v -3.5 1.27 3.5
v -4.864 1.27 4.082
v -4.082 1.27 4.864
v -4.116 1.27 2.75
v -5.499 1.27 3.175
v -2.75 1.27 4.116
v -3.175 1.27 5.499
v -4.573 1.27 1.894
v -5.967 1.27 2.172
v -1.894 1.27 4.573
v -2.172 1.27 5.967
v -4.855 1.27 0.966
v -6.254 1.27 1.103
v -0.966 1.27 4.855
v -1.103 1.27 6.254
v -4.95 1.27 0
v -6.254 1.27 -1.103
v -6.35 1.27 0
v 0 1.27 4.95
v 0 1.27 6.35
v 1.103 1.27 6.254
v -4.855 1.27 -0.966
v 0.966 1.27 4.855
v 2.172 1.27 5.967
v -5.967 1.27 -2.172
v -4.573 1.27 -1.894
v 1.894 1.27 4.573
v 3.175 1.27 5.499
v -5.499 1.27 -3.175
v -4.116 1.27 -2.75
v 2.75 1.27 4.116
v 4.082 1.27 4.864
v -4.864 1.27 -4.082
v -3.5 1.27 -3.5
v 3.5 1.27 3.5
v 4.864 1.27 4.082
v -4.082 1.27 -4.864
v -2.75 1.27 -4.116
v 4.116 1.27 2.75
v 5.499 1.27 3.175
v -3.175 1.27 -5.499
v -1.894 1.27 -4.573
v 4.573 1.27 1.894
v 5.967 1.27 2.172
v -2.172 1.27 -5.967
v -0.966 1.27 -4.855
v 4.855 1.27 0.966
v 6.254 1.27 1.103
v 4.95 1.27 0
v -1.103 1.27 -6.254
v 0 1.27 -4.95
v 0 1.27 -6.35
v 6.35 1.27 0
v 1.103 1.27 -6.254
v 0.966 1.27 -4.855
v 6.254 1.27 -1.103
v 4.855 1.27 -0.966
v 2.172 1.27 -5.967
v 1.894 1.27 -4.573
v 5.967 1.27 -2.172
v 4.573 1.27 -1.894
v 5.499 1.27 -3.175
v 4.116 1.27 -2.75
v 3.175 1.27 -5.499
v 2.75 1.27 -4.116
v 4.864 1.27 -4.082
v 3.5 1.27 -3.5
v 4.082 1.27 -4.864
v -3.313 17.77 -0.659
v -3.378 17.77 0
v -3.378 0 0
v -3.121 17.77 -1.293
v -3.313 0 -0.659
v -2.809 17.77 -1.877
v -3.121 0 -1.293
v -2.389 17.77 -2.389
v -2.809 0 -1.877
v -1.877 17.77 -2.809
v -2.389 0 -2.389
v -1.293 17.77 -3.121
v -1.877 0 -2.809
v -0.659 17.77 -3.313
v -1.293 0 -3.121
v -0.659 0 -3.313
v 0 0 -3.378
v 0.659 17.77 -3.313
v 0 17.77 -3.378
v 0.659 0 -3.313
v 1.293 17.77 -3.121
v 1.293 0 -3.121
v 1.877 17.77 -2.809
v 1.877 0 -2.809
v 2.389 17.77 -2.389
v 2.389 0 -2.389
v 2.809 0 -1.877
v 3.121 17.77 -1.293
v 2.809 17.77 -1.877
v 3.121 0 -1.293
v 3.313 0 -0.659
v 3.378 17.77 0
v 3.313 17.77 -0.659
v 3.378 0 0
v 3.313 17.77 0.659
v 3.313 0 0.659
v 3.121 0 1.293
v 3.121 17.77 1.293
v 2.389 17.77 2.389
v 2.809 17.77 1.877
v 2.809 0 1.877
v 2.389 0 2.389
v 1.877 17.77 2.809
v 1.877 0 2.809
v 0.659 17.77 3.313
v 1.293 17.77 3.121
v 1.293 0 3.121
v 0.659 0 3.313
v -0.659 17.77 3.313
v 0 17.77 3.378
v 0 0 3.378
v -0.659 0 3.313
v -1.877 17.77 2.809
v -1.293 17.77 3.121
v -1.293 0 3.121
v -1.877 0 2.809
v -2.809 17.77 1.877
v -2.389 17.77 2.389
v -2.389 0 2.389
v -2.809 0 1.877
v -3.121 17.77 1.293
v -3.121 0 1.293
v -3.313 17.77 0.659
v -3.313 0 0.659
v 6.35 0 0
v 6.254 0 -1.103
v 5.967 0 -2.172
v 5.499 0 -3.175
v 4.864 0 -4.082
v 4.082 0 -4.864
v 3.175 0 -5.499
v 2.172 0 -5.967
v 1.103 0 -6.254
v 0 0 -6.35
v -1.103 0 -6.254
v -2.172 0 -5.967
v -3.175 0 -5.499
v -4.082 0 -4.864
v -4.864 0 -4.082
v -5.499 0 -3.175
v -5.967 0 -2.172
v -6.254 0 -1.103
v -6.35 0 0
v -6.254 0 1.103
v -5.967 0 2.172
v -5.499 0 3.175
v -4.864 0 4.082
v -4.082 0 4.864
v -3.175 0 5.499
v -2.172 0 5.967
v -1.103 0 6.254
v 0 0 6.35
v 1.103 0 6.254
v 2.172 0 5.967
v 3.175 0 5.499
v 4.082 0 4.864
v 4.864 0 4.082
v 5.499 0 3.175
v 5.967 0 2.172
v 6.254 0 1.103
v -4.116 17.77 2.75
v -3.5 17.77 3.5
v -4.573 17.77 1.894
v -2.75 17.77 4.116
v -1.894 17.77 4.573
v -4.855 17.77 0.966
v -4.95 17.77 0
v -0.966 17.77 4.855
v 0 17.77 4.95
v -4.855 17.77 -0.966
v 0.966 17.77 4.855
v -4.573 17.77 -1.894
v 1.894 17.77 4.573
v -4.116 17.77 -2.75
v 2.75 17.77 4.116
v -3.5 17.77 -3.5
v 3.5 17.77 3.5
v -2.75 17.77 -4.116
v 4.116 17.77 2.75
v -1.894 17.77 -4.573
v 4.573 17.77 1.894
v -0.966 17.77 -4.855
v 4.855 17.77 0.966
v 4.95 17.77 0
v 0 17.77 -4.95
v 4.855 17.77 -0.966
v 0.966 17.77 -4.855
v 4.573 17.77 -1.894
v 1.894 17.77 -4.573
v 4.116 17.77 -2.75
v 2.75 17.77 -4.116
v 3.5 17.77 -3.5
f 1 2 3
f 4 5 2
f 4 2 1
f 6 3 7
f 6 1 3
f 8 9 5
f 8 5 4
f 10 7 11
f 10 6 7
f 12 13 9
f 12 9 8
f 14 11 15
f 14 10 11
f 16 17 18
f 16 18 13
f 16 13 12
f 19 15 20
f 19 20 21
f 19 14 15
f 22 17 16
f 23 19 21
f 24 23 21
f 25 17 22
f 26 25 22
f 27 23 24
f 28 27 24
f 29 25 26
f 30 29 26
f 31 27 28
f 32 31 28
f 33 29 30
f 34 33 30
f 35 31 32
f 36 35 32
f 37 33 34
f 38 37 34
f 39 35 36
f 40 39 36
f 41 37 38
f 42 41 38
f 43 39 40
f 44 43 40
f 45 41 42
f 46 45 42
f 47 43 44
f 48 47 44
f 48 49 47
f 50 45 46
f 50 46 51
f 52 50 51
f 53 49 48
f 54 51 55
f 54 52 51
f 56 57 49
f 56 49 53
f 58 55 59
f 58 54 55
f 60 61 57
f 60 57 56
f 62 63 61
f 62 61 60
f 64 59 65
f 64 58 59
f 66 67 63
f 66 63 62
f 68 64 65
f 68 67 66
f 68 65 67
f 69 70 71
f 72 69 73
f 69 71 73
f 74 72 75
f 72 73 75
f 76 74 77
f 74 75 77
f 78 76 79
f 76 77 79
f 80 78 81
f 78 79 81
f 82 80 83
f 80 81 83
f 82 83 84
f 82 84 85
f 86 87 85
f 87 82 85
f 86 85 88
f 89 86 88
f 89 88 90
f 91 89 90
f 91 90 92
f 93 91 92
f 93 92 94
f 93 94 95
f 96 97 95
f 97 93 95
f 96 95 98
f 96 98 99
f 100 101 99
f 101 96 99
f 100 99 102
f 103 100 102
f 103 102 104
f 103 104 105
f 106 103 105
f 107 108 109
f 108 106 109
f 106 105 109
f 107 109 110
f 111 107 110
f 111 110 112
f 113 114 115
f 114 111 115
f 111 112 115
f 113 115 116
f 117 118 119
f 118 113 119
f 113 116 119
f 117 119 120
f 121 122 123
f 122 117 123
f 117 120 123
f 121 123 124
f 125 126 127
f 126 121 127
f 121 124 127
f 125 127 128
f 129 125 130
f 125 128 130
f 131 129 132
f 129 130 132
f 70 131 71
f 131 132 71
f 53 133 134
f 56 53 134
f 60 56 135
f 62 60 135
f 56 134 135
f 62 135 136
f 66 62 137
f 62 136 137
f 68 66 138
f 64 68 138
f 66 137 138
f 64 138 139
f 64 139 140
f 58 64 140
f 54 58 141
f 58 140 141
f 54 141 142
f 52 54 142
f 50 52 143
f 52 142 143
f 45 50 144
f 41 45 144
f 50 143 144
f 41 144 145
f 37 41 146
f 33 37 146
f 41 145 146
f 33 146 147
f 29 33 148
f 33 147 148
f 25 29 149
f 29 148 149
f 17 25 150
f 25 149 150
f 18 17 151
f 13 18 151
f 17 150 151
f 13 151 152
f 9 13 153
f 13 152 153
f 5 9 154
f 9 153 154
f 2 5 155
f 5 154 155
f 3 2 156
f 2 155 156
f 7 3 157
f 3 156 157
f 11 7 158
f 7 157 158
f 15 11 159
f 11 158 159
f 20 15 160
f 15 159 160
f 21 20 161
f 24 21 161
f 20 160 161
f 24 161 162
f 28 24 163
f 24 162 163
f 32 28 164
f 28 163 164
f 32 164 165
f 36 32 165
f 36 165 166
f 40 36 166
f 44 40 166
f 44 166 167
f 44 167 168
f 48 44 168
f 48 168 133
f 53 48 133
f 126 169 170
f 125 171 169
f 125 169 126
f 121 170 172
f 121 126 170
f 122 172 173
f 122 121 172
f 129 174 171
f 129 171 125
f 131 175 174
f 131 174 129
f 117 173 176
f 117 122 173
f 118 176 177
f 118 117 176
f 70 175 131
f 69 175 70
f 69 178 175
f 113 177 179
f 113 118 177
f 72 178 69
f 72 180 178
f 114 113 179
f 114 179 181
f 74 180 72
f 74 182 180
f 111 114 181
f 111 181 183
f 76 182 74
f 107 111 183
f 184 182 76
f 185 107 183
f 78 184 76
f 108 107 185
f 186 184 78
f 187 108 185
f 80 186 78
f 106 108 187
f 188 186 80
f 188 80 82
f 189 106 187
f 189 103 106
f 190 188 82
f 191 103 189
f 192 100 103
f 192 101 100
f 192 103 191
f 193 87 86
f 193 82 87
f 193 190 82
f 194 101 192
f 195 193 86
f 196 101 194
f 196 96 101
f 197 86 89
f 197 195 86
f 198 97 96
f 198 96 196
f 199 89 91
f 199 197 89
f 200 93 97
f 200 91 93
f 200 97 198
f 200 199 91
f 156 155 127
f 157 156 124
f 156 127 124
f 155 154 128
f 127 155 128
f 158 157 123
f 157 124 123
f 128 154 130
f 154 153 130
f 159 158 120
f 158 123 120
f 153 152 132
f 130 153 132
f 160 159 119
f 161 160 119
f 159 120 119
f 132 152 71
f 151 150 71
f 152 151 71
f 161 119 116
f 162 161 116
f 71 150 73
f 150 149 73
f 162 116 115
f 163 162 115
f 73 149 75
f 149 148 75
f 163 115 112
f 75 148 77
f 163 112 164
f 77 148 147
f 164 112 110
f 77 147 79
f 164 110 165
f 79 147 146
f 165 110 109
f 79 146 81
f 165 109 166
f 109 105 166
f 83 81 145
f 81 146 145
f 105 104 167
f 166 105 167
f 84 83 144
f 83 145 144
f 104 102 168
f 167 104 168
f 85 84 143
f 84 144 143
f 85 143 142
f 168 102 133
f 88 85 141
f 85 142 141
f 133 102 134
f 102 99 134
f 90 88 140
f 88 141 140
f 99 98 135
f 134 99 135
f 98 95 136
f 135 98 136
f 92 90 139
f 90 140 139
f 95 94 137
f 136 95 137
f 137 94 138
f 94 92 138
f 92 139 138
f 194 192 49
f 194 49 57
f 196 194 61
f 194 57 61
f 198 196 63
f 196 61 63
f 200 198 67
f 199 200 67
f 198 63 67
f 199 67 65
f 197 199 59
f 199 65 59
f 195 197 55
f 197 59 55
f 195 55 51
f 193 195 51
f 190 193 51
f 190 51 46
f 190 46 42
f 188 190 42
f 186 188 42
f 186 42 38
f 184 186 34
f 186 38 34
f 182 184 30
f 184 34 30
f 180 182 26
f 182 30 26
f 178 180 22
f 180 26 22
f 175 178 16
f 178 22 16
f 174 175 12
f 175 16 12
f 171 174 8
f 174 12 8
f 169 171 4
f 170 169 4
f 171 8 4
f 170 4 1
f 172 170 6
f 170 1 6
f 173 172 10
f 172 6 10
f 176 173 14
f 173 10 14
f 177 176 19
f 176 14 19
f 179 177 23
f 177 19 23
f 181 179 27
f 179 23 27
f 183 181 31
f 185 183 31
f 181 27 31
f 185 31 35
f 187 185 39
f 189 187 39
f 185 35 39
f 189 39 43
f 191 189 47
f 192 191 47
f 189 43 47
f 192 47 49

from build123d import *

# Parameters (mm, degrees)
SKETCH1_R               = 6.35
BOSS_EXTRUDE1_DEPTH     = 1.27
SKETCH2_R               = 4.95
SKETCH2_R_2             = 3.3782
BOSS_EXTRUDE2_DEPTH     = 16.49959986
SKETCH3_R               = 3.3782
CUT_EXTRUDE1_DEPTH      = 1
CUT_EXTRUDE1_DEPTH_BACK = 18.76959986


with BuildPart() as part:
    # Sketch1 → Boss-Extrude1 (new body)
    with BuildSketch(Plane(origin=(0, 0, 0), x_dir=(1, 0, 0), z_dir=(0, 1, 0))):
        Circle(SKETCH1_R)
    extrude(amount=BOSS_EXTRUDE1_DEPTH)

    # Sketch2 → Boss-Extrude2 (add)
    with BuildSketch(Plane(origin=(0, 1.27, 0), x_dir=(1, 0, 0), z_dir=(0, 1, 0))):
        Circle(SKETCH2_R)
        Circle(SKETCH2_R_2, mode=Mode.SUBTRACT)
    extrude(amount=BOSS_EXTRUDE2_DEPTH)

    # Sketch3 → Cut-Extrude1 (cut, two sides)
    with BuildSketch(Plane(origin=(0, 0, 0), x_dir=(-1, 0, 0), z_dir=(0, -1, 0))) as cut_extrude1_sk:
        Circle(SKETCH3_R)
    extrude(amount=CUT_EXTRUDE1_DEPTH, mode=Mode.SUBTRACT)
    extrude(cut_extrude1_sk.sketch, amount=-CUT_EXTRUDE1_DEPTH_BACK, mode=Mode.SUBTRACT)


solid = part.part
